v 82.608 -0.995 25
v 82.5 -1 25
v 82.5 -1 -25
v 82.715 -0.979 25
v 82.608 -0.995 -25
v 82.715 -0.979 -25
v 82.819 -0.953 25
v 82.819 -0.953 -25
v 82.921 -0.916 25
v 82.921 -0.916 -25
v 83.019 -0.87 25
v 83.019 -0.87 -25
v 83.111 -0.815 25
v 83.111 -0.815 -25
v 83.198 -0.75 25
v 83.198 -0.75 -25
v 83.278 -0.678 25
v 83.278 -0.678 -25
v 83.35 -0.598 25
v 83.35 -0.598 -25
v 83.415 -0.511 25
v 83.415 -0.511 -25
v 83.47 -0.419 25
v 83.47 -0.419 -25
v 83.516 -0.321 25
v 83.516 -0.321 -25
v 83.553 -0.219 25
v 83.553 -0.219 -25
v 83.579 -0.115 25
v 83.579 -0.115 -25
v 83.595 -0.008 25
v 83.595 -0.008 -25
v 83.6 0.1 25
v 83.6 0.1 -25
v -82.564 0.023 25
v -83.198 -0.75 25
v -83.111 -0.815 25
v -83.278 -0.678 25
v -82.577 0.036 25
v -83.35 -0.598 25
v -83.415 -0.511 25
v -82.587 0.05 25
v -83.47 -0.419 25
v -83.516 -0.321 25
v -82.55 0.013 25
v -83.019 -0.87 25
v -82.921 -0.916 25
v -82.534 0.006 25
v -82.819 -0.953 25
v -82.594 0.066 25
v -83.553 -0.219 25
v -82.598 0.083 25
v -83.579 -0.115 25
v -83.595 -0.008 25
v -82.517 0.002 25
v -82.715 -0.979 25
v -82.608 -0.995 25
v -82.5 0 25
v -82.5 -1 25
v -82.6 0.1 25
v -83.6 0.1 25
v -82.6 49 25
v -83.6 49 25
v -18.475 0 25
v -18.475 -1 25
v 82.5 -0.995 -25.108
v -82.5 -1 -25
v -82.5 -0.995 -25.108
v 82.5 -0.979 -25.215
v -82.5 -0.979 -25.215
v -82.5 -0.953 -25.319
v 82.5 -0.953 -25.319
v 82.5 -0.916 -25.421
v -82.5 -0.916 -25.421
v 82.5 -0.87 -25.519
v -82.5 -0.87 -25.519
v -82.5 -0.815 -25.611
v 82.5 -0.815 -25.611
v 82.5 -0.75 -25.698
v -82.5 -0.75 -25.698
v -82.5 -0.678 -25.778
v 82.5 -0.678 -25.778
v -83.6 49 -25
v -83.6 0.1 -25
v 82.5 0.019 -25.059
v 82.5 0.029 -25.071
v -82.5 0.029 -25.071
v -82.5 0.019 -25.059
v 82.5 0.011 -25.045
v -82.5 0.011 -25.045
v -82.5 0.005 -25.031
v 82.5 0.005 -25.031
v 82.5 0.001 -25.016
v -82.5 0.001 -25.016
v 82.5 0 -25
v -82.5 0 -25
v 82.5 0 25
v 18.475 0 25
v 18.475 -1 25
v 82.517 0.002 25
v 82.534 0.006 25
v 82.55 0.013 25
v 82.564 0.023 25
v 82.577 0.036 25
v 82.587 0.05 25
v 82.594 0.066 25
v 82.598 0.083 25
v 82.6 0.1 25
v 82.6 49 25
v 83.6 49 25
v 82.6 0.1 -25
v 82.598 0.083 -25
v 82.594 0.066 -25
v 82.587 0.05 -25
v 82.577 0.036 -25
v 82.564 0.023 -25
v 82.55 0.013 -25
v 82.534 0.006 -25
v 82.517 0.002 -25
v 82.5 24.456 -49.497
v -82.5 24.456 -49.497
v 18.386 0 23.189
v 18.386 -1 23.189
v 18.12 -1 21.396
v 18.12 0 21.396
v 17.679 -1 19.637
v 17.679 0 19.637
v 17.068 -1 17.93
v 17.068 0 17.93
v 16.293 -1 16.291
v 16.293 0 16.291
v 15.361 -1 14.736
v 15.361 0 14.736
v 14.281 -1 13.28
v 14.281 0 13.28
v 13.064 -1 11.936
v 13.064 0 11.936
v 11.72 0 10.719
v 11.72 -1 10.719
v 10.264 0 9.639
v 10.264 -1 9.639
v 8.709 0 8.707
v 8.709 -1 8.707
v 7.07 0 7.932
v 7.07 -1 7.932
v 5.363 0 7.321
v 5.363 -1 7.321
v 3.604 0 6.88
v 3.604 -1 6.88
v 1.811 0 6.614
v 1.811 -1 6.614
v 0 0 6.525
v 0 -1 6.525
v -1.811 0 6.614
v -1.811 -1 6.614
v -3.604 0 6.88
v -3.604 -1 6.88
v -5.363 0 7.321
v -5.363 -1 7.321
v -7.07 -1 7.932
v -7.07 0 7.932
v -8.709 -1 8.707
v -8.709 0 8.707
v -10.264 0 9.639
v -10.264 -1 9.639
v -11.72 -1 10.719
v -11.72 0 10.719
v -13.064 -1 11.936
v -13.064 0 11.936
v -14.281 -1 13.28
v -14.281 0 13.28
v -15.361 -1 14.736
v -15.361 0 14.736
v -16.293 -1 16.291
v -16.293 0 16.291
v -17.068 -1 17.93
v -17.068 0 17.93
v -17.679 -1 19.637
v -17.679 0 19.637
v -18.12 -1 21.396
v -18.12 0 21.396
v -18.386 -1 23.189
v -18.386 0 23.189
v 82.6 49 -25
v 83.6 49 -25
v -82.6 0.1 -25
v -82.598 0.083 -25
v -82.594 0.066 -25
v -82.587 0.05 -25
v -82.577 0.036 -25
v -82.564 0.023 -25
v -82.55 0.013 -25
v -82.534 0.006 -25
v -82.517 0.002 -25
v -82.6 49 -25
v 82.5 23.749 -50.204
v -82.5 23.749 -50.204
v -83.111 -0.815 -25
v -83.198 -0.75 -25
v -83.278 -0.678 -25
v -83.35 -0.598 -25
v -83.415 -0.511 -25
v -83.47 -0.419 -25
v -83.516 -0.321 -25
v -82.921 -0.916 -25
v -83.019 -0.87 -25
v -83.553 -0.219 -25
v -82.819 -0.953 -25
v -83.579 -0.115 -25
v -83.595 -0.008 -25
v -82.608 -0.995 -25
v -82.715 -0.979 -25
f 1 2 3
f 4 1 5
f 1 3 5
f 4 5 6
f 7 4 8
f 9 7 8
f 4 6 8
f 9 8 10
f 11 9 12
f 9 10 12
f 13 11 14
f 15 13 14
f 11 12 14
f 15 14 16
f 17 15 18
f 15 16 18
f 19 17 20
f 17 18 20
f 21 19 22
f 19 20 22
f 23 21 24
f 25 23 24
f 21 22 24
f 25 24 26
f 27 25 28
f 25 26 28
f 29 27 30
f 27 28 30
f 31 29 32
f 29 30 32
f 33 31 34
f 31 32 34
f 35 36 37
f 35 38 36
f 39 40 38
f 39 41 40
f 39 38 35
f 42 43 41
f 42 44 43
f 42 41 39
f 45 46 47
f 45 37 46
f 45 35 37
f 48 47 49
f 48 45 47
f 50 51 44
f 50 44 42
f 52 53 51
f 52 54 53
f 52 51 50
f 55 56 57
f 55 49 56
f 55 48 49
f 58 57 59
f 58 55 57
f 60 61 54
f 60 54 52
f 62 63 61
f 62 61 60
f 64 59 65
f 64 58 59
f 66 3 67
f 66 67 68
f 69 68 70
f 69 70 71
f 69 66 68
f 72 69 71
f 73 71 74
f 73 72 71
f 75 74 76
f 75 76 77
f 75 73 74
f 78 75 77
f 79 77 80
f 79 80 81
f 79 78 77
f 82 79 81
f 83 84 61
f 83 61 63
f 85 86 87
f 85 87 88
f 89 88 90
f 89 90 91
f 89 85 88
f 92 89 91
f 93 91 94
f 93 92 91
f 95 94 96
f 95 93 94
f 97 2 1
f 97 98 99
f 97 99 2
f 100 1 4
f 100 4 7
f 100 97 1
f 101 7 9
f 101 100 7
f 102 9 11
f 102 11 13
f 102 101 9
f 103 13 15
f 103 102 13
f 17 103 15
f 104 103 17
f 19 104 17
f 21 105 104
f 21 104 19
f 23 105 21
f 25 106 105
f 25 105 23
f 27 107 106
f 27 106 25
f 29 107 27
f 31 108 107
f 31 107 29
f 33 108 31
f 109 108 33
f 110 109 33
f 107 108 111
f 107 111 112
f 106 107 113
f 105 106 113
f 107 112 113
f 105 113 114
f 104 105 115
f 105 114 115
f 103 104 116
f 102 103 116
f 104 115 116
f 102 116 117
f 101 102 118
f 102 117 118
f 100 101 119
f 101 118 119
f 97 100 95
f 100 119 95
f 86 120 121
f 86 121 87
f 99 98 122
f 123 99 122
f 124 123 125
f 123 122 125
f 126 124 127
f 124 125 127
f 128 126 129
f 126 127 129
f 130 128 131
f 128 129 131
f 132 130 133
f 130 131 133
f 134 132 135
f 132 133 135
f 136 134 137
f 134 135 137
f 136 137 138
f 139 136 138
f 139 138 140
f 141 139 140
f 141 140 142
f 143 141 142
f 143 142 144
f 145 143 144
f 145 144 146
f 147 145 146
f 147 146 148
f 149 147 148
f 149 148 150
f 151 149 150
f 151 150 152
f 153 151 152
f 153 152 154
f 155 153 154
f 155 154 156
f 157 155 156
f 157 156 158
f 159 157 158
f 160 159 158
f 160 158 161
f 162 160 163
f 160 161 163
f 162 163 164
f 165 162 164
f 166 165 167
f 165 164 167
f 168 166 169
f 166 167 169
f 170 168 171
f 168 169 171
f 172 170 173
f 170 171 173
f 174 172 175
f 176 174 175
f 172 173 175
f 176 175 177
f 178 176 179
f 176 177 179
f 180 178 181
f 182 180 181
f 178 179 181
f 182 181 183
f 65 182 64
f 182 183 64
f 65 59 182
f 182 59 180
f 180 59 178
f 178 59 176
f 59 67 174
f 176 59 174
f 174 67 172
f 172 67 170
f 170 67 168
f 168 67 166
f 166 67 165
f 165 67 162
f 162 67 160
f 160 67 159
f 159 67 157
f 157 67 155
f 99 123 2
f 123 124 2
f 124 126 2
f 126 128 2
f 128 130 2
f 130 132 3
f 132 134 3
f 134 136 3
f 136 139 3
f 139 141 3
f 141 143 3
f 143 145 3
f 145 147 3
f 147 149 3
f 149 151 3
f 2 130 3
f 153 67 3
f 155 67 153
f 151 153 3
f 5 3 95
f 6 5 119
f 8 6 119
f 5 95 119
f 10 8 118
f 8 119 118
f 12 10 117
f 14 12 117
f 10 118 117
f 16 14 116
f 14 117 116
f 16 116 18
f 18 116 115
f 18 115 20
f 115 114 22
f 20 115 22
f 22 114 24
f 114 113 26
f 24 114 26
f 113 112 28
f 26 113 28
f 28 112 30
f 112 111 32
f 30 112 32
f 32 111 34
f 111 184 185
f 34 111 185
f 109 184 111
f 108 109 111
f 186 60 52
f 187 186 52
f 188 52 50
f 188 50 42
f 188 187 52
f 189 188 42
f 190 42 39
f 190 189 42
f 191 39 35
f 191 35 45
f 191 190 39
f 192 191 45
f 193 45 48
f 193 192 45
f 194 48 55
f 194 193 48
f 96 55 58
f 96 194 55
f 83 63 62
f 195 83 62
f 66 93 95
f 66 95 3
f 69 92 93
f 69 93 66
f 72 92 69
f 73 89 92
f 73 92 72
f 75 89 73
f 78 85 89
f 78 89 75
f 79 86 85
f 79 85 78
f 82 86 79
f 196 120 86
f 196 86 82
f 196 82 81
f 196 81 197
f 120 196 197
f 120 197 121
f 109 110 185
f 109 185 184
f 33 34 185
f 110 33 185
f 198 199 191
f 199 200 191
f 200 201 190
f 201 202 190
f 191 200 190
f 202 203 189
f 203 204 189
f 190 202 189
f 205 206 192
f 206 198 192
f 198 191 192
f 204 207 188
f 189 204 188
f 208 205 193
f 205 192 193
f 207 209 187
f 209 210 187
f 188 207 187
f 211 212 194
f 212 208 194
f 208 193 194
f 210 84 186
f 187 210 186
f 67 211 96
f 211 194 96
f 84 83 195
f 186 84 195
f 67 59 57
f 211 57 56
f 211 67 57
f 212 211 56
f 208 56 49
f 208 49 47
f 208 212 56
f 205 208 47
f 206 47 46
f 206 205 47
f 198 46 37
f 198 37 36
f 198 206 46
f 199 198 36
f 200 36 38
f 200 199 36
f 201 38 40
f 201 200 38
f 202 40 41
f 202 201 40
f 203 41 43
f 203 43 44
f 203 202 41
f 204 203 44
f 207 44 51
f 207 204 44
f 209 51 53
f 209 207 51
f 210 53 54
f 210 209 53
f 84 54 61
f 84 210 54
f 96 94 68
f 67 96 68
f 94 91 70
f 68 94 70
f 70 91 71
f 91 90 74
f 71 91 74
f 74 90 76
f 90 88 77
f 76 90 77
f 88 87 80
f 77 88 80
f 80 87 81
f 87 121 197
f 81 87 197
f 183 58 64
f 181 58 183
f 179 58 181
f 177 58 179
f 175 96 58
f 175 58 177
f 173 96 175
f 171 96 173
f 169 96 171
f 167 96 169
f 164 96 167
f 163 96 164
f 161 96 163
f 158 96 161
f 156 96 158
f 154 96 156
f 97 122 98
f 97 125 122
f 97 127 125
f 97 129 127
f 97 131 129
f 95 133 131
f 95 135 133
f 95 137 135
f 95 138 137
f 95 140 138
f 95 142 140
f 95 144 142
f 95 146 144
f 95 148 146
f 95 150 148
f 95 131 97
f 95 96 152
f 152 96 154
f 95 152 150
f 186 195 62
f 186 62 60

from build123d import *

# Parameters (mm, degrees)
SKETCH_1_W             = 165
SKETCH_1_H             = 50
SM_BASE_FLANGE_1_DEPTH = 1
SM_EDGE_FLANGE_1_DEPTH = 50
SKETCH_9_R             = 18.474720046
CUT_EXTRUDE_1_DEPTH    = 10
SM_EDGE_FLANGE_2_DEPTH = 165


# Sheet-metal steps are written as plain solids
with BuildPart() as part:
    # Sketch 1 → 基体-法兰1 (new body)
    with BuildSketch(Plane(origin=(0, 0, 0), x_dir=(1, 0, 0), z_dir=(0, 1, 0))):
        Rectangle(SKETCH_1_W, SKETCH_1_H)
    extrude(amount=-SM_BASE_FLANGE_1_DEPTH)

    # 边线-法兰1 section (across the edge) → 边线-法兰1 (add)
    with BuildSketch(Plane(origin=(-82.6, 0, -25), x_dir=(1, 0, 0), z_dir=(0, 0, 1))):
        with BuildLine():
            Line((-1, 0.1), (-1, 49))
            Line((-1, 49), (0, 49))
            Line((0, 49), (0, 0.1))
            ThreePointArc((0, 0.1), (0.029289322, 0.029289322), (0.1, 0))
            Line((0.1, 0), (0.1, -1))
            ThreePointArc((0.1, -1), (-0.677817459, -0.677817459), (-1, 0.1))
        make_face()
    sm_edge_flange_1 = extrude(amount=SM_EDGE_FLANGE_1_DEPTH)

    # 镜向1: 边线-法兰1 across plane
    add(sm_edge_flange_1.mirror(Plane(origin=(0, 0, 0), x_dir=(0, 0, 1), z_dir=(1, 0, 0))))

    # 草图9 → 切除-拉伸1 (cut)
    with BuildSketch(Plane(origin=(0, 0, 0), x_dir=(1, 0, 0), z_dir=(0, 1, 0))):
        with Locations((0, -25)):
            Circle(SKETCH_9_R)
    extrude(amount=-CUT_EXTRUDE_1_DEPTH, mode=Mode.SUBTRACT)

    # 边线-法兰2 section (across the edge) → 边线-法兰2 (add)
    with BuildSketch(Plane(origin=(82.5, 0, -25.041421356), x_dir=(0, 0.7071067811865512, 0.7071067811865438), z_dir=(-1, 0, 0))):
        with BuildLine():
            Line((-1, 0.041421356), (-1, 34.585786438))
            Line((-1, 34.585786438), (0, 34.585786438))
            Line((0, 34.585786438), (0, 0.041421356))
            ThreePointArc((0, 0.041421356), (0.007612047, 0.003153013), (0.029289322, -0.029289322))
            Line((0.029289322, -0.029289322), (-0.677817459, -0.736396103))
            ThreePointArc((-0.677817459, -0.736396103), (-0.916267486, -0.379530419), (-1, 0.041421356))
        make_face()
    extrude(amount=SM_EDGE_FLANGE_2_DEPTH)


solid = part.part
